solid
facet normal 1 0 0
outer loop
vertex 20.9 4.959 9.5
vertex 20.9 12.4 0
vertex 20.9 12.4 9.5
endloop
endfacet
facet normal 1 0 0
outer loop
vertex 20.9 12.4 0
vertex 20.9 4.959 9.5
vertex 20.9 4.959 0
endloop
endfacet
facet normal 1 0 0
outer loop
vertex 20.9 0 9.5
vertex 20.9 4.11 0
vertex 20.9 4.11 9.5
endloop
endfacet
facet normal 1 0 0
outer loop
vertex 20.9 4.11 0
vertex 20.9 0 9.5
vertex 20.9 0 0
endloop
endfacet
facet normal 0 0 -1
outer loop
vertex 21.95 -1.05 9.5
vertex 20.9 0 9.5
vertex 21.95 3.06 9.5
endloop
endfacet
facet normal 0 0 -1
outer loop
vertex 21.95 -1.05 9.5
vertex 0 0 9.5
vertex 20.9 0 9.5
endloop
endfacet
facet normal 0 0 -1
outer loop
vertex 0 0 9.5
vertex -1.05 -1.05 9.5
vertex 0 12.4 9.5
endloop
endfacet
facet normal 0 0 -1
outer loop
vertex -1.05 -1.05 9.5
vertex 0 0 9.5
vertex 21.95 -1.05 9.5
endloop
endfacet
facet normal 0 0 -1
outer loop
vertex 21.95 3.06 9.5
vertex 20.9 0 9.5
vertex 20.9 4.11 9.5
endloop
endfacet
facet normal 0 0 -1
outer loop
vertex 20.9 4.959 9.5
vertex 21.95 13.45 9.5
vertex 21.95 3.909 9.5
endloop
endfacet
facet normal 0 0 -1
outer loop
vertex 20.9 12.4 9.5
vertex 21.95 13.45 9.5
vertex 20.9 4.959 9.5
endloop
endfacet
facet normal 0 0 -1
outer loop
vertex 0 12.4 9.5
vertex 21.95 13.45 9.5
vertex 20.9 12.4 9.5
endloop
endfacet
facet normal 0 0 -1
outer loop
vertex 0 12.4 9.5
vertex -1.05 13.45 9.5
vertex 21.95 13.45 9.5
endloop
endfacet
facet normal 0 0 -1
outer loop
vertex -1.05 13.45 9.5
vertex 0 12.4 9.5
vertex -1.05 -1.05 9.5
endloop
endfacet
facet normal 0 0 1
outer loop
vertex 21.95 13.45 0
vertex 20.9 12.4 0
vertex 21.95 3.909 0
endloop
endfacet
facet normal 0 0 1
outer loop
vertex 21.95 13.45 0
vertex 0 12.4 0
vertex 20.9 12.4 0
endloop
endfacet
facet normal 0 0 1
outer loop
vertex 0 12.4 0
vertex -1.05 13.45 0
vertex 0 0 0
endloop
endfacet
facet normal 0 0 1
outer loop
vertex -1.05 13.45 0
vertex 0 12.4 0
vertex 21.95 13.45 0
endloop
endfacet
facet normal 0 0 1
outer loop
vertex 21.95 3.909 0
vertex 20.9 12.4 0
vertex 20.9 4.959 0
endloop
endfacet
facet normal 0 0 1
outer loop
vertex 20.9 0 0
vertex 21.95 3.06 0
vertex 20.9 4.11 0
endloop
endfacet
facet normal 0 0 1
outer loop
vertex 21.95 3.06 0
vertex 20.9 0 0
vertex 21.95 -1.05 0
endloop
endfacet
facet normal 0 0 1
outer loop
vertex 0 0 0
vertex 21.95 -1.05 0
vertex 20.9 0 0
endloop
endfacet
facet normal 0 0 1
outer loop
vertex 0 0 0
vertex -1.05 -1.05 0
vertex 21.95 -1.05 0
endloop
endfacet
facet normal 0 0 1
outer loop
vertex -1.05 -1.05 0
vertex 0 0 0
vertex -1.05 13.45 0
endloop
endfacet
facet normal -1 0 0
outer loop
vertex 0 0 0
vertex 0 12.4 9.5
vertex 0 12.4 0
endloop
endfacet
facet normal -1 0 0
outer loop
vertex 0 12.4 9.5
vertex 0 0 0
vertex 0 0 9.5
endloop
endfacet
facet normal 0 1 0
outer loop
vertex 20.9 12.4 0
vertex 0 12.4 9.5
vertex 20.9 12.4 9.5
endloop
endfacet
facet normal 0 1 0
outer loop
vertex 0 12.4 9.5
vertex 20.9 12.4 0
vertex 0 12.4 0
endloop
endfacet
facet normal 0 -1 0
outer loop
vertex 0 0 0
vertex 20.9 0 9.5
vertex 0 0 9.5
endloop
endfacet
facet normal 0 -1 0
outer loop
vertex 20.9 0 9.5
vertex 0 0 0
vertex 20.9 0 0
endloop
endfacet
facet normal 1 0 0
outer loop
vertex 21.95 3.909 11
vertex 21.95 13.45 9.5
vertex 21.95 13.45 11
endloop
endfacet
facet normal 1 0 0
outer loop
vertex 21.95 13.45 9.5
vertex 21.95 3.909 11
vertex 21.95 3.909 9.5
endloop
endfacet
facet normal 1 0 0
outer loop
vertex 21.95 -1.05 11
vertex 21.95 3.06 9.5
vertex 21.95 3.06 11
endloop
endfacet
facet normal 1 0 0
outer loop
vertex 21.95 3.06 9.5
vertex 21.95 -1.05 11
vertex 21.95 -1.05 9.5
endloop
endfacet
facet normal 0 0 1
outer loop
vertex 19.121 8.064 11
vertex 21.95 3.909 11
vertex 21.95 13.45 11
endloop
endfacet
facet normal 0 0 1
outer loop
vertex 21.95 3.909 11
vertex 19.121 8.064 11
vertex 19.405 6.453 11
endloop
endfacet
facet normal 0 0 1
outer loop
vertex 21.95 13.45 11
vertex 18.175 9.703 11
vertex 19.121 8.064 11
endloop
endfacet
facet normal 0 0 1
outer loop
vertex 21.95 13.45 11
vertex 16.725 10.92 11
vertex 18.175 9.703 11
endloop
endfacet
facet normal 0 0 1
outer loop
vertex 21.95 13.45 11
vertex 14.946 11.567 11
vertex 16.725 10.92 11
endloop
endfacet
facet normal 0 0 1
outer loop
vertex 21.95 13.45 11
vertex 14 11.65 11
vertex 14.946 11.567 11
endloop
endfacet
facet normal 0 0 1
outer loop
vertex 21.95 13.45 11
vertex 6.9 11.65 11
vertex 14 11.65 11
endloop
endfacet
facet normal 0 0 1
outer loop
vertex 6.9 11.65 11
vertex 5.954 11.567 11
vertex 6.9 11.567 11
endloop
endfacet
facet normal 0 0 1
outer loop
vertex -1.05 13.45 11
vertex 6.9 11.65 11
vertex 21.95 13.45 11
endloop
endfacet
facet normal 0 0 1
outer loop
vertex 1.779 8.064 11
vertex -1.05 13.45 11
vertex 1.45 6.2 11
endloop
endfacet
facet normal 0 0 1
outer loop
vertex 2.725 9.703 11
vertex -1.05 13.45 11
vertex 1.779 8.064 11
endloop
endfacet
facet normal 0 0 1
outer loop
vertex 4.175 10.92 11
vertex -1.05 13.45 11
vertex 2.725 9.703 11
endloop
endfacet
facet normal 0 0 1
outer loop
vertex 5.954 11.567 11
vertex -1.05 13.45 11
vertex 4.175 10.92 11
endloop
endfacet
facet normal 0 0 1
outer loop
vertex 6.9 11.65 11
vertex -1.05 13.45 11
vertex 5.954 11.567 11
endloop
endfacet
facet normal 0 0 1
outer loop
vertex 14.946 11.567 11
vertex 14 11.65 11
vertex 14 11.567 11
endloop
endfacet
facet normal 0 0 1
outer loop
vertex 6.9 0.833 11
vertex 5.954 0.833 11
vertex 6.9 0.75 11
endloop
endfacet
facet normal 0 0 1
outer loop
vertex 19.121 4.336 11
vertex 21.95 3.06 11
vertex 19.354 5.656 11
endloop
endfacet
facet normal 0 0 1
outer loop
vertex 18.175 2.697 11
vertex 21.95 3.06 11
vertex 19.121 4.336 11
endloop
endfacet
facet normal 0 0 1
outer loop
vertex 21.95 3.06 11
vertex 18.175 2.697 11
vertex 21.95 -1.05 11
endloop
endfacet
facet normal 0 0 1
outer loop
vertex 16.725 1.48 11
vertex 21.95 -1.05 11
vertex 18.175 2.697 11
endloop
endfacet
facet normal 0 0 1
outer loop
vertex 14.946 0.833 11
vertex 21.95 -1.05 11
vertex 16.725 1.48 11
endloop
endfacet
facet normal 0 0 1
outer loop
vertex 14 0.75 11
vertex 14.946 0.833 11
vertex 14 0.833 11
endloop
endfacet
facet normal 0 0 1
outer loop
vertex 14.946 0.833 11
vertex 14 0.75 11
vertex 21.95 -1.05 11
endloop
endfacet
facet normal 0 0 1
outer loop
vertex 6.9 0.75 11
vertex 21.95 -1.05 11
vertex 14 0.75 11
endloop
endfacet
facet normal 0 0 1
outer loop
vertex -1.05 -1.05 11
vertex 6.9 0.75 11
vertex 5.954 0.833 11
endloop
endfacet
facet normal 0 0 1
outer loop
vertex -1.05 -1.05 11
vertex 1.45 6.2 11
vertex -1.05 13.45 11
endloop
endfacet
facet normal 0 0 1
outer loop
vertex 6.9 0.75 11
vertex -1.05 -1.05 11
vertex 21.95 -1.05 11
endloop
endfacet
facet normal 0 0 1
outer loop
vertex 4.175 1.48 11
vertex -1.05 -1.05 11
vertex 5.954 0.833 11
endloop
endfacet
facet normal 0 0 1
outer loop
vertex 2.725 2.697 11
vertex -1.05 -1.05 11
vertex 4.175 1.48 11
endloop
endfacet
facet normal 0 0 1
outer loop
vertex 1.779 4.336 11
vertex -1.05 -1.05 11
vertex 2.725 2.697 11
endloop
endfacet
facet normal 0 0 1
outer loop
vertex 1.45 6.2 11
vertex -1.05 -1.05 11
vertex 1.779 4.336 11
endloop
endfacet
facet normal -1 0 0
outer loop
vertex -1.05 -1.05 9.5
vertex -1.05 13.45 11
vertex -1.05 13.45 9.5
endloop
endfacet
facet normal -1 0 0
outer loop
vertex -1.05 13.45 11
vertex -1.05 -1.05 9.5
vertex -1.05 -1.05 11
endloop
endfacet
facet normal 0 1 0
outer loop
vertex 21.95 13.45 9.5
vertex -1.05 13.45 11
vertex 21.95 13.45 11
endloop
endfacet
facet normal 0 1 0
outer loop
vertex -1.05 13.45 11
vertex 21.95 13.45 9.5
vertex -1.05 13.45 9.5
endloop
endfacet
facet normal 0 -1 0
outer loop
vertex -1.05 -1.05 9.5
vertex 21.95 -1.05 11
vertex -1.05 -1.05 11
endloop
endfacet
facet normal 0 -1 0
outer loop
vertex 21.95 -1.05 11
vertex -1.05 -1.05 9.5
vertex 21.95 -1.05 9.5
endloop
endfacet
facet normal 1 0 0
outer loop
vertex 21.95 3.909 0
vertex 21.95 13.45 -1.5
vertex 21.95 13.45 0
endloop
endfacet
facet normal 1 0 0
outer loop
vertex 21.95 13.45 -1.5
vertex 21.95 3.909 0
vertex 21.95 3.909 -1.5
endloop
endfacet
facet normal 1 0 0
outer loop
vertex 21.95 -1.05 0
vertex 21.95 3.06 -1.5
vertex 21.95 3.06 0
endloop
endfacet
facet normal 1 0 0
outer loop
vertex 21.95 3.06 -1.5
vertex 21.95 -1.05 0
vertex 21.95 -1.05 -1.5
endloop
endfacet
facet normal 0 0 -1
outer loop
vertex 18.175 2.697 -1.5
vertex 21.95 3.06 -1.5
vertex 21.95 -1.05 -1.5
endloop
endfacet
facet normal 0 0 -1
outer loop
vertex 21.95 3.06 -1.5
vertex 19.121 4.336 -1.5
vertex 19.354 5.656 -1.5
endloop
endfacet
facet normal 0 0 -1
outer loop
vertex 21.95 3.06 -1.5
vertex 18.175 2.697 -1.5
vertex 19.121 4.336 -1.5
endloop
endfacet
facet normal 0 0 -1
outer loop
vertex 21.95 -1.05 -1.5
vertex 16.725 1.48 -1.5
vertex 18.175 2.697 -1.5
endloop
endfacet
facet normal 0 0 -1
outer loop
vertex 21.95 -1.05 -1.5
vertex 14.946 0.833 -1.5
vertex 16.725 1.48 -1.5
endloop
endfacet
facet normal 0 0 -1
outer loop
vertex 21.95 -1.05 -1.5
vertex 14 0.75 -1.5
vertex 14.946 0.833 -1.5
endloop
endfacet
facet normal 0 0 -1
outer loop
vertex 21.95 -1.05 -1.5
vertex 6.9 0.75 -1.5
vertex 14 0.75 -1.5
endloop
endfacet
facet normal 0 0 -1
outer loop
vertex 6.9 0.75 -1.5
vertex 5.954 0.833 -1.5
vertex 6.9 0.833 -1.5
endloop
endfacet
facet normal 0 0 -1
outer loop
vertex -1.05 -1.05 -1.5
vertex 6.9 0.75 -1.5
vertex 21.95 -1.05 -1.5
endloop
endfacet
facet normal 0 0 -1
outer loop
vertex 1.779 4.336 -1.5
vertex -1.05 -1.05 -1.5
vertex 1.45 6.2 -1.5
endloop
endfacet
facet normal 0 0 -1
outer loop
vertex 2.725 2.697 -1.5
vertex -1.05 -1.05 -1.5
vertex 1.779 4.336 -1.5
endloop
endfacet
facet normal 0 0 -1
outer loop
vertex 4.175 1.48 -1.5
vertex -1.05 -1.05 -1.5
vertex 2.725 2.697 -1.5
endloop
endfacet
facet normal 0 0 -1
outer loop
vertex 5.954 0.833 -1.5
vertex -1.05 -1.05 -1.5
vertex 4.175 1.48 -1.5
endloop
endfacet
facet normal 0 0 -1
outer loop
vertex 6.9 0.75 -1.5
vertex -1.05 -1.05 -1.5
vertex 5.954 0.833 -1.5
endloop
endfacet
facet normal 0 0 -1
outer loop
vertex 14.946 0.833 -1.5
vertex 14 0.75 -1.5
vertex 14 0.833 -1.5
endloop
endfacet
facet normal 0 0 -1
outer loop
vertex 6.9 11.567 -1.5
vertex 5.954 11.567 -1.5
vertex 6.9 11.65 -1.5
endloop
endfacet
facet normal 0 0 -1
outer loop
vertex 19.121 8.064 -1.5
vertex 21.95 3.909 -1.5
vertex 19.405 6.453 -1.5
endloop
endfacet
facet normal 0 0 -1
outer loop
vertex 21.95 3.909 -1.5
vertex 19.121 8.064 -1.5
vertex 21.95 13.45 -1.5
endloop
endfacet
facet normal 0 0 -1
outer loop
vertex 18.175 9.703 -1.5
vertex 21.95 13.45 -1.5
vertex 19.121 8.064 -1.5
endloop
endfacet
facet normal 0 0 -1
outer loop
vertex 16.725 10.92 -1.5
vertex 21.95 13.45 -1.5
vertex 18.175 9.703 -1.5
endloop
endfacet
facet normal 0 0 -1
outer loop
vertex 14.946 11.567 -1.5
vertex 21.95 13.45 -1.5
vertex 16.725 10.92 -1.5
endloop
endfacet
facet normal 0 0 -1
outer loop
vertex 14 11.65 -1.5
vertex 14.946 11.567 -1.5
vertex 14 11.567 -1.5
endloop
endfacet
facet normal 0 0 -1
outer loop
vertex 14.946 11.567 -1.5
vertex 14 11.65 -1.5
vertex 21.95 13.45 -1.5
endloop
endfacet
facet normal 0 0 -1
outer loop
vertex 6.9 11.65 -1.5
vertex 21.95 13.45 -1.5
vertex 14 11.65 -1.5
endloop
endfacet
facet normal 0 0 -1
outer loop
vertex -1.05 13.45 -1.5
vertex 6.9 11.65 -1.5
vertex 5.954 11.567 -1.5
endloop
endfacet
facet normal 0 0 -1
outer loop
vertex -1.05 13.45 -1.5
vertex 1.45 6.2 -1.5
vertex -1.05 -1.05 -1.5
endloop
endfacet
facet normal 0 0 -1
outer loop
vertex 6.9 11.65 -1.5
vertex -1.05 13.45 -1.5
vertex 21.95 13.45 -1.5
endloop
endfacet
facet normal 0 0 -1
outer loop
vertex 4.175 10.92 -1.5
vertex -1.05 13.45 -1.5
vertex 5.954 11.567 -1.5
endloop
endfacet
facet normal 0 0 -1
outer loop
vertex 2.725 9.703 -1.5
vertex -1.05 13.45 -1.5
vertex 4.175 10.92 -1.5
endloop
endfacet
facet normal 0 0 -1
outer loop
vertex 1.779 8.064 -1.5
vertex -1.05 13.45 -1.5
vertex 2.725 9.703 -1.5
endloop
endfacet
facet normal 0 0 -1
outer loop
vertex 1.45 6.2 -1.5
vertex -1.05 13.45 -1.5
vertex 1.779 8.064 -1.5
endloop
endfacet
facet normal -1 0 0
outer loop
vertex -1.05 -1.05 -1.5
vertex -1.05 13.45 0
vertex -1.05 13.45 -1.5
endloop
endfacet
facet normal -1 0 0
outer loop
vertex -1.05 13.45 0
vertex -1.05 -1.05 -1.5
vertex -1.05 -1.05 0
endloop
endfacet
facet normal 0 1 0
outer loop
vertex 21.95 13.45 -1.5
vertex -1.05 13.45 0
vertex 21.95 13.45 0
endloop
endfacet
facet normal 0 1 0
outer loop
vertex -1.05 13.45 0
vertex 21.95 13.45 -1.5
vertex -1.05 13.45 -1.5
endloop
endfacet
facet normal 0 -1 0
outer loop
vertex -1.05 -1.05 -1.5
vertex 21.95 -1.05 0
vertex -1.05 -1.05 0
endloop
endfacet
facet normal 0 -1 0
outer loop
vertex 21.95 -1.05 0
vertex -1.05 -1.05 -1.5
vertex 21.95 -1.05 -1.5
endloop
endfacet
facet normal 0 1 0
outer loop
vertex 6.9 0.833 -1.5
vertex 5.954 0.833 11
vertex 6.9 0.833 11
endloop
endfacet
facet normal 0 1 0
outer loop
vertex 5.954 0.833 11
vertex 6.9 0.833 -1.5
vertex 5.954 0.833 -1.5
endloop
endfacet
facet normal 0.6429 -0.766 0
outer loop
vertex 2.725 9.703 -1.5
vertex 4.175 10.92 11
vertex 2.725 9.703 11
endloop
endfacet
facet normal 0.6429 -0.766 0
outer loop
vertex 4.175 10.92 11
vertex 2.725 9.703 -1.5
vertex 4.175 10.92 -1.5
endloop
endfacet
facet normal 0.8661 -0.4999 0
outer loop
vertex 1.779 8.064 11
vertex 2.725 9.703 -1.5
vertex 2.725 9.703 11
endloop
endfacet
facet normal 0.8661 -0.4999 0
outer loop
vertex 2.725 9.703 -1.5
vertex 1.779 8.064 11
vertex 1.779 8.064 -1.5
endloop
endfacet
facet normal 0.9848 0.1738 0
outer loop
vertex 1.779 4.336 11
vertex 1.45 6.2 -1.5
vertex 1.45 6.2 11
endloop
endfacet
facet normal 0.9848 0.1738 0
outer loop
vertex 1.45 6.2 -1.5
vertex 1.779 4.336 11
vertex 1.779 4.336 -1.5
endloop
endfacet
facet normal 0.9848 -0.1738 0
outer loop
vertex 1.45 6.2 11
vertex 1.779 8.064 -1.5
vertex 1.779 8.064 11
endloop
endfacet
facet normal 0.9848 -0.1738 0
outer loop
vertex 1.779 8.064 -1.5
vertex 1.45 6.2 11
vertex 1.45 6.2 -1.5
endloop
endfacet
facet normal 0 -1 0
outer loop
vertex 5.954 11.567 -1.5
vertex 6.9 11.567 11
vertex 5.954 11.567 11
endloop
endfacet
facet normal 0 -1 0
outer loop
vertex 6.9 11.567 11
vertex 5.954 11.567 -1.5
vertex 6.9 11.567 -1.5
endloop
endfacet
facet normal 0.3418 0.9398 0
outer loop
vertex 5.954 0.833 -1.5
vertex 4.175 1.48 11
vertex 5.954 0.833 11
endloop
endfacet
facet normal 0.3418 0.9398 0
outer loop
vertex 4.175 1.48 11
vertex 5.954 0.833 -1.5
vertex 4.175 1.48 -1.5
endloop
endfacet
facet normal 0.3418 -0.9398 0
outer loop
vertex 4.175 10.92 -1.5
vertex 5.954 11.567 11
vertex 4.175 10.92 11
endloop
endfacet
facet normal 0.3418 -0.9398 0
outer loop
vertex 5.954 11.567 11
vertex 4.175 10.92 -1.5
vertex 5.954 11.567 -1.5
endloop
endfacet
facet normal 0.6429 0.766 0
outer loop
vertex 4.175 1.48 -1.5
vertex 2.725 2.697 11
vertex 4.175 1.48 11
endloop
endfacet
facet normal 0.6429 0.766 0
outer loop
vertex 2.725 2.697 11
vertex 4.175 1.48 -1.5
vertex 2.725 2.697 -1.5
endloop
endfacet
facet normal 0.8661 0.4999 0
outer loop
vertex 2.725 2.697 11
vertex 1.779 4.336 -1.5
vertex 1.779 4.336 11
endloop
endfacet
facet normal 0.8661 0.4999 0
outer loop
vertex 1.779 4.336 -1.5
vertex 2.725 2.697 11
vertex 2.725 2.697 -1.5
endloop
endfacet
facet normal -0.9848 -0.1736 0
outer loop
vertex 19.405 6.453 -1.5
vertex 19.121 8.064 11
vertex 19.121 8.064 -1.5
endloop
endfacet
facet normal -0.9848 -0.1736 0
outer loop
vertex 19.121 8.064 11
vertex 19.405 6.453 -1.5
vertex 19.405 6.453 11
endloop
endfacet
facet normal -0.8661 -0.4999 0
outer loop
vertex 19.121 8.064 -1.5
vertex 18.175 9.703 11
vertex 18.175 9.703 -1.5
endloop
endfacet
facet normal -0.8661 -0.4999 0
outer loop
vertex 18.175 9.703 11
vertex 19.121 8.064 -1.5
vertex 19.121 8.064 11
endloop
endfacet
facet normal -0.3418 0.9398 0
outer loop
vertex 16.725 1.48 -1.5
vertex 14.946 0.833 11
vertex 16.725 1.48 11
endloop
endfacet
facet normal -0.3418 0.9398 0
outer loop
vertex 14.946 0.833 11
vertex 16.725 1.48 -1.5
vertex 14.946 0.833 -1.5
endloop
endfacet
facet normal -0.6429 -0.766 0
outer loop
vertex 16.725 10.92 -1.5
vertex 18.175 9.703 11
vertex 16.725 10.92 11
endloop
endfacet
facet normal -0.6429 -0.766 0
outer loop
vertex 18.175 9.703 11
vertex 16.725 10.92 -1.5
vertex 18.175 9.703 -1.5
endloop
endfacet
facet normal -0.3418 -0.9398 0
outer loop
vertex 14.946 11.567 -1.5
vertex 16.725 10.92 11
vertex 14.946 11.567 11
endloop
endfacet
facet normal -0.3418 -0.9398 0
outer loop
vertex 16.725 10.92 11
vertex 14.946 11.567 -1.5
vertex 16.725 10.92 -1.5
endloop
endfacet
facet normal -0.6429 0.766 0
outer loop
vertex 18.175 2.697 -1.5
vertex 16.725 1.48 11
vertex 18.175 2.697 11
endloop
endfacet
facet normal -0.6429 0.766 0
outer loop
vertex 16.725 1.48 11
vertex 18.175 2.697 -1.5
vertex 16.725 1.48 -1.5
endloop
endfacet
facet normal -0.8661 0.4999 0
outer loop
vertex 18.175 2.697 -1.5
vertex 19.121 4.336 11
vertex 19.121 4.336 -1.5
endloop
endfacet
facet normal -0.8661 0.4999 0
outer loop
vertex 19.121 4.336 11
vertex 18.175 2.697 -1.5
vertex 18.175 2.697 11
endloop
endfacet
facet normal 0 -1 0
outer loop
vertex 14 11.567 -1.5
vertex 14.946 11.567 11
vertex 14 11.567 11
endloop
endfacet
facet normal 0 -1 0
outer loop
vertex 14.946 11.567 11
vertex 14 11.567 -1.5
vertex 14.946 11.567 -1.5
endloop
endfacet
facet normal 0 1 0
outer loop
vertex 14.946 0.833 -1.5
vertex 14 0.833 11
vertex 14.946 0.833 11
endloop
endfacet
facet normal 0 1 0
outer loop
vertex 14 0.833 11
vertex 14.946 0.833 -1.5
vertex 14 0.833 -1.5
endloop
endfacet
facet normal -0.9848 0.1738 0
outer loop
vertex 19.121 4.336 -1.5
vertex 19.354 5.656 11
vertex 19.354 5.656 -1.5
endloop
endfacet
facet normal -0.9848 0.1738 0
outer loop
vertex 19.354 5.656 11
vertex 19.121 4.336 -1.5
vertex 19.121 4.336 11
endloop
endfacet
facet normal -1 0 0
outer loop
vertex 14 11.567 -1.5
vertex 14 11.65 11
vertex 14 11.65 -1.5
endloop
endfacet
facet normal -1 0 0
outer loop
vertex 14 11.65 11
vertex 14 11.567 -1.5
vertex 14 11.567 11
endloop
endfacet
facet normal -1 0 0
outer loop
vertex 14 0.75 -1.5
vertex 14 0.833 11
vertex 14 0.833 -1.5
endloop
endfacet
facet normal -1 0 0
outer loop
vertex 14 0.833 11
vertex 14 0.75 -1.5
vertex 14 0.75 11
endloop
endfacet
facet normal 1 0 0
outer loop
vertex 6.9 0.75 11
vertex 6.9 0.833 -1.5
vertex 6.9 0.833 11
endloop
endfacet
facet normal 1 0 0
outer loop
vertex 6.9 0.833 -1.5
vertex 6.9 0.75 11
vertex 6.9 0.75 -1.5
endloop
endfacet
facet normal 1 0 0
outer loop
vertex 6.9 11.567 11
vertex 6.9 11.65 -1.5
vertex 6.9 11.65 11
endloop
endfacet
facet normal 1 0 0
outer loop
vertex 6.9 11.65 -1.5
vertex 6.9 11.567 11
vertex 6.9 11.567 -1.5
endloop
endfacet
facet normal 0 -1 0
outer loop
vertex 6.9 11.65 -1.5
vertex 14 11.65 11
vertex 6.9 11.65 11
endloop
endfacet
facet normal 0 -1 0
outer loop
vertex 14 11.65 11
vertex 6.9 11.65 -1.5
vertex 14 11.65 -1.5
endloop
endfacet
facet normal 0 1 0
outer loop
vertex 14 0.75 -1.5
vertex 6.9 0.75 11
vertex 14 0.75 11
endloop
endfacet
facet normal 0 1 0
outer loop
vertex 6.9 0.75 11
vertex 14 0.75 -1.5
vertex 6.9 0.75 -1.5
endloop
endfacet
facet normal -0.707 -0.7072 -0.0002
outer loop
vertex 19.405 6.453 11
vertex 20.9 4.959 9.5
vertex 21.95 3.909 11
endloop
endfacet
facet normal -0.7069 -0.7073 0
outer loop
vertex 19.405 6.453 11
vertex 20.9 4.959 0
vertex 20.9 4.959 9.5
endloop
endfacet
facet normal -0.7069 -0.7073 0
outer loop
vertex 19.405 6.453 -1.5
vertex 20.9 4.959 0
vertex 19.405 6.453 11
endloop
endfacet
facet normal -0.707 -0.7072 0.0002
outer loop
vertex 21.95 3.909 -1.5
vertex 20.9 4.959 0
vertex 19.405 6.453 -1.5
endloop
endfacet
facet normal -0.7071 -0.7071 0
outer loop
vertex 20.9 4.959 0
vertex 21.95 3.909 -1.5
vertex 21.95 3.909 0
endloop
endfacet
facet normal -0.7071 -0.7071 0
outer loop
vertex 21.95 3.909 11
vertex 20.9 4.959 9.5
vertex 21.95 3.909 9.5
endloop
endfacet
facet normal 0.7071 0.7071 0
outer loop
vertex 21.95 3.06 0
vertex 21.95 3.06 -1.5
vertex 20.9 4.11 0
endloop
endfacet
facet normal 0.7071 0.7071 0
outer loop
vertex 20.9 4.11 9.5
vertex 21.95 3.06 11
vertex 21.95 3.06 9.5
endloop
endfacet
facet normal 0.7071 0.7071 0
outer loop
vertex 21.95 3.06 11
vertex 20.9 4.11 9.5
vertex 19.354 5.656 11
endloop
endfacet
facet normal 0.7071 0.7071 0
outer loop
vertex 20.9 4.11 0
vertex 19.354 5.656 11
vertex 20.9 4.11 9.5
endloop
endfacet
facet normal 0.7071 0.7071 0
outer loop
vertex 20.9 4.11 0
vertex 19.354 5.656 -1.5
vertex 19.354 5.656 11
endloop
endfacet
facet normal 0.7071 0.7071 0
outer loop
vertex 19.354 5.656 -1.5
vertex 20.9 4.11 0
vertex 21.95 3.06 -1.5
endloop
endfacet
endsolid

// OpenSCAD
/* [Guide Dimensions] */
// width of the belt guide, not including overlap
width = 20.9;
// depth of the belt guide, not including overlap
depth = 12.4;
// heigth of the belt guide, not including overhang thickness
height = 9.5;
/* [Overlap adjustments] */
// thickness of the plates that keep the guide from sliding up and down
plate_thickness = 1.5;
// amount by which the top and bottom plates overlap the edges of the guide body
overlap = 1.05;
/* [Belt slit] */
// the angle at which the slit is set into the wall of the guide
slit_angle = -45;
// the width of the slit (can easily be smaller than the thickness of the belt, as the guide will flex)
slit_width = 0.6;
/* [Guide opening] */
// the width of the opening for guiding the belt
opening_width = 18;
// the depth of the opening for guiding the belt
opening_depth = 10.9;

module slit() {
    rotate([0,0,slit_angle]) {
        cube([10,slit_width,height+3*plate_thickness]);
    }
}

module opening(thing_height, thing_depth, thing_width, opening_depth, opening_width) {
    z_offset = 2.5;
    opening_height=thing_height+2*z_offset;
    y_midpoint = thing_depth/2;
    x_midpoint = thing_width/2;
    opening_radius = opening_depth/2;
    left_cylinder_x_center = thing_width/2 - opening_width/2 + opening_radius;
    right_cylinder_x_center = thing_width/2 + opening_width/2 - opening_radius;
    
    translate([left_cylinder_x_center,y_midpoint,-z_offset]) {
        cylinder(h=opening_height,r=opening_radius);
    }
    translate([right_cylinder_x_center,y_midpoint,-z_offset]) {
        cylinder(h=opening_height,r=opening_radius);
    }
    translate([left_cylinder_x_center,y_midpoint-opening_radius,-z_offset]) {
        cube([opening_width-opening_depth,opening_depth,opening_height]);
    }
}


difference() {
    union() {
        cube([width,depth,height]);
        translate([-overlap,-overlap,height]) {
            cube([width+2*overlap,depth+2*overlap,plate_thickness]);
        };

        translate([-overlap,-overlap,-plate_thickness]) {
            cube([width+2*overlap,depth+2*overlap,plate_thickness]);
        };
    }
    opening(thing_height=height, thing_depth=depth, thing_width=width, opening_width = opening_width, opening_depth=opening_depth);
    translate([width*.9,depth/2,-1.5*plate_thickness]) {
        slit();
    }
}
